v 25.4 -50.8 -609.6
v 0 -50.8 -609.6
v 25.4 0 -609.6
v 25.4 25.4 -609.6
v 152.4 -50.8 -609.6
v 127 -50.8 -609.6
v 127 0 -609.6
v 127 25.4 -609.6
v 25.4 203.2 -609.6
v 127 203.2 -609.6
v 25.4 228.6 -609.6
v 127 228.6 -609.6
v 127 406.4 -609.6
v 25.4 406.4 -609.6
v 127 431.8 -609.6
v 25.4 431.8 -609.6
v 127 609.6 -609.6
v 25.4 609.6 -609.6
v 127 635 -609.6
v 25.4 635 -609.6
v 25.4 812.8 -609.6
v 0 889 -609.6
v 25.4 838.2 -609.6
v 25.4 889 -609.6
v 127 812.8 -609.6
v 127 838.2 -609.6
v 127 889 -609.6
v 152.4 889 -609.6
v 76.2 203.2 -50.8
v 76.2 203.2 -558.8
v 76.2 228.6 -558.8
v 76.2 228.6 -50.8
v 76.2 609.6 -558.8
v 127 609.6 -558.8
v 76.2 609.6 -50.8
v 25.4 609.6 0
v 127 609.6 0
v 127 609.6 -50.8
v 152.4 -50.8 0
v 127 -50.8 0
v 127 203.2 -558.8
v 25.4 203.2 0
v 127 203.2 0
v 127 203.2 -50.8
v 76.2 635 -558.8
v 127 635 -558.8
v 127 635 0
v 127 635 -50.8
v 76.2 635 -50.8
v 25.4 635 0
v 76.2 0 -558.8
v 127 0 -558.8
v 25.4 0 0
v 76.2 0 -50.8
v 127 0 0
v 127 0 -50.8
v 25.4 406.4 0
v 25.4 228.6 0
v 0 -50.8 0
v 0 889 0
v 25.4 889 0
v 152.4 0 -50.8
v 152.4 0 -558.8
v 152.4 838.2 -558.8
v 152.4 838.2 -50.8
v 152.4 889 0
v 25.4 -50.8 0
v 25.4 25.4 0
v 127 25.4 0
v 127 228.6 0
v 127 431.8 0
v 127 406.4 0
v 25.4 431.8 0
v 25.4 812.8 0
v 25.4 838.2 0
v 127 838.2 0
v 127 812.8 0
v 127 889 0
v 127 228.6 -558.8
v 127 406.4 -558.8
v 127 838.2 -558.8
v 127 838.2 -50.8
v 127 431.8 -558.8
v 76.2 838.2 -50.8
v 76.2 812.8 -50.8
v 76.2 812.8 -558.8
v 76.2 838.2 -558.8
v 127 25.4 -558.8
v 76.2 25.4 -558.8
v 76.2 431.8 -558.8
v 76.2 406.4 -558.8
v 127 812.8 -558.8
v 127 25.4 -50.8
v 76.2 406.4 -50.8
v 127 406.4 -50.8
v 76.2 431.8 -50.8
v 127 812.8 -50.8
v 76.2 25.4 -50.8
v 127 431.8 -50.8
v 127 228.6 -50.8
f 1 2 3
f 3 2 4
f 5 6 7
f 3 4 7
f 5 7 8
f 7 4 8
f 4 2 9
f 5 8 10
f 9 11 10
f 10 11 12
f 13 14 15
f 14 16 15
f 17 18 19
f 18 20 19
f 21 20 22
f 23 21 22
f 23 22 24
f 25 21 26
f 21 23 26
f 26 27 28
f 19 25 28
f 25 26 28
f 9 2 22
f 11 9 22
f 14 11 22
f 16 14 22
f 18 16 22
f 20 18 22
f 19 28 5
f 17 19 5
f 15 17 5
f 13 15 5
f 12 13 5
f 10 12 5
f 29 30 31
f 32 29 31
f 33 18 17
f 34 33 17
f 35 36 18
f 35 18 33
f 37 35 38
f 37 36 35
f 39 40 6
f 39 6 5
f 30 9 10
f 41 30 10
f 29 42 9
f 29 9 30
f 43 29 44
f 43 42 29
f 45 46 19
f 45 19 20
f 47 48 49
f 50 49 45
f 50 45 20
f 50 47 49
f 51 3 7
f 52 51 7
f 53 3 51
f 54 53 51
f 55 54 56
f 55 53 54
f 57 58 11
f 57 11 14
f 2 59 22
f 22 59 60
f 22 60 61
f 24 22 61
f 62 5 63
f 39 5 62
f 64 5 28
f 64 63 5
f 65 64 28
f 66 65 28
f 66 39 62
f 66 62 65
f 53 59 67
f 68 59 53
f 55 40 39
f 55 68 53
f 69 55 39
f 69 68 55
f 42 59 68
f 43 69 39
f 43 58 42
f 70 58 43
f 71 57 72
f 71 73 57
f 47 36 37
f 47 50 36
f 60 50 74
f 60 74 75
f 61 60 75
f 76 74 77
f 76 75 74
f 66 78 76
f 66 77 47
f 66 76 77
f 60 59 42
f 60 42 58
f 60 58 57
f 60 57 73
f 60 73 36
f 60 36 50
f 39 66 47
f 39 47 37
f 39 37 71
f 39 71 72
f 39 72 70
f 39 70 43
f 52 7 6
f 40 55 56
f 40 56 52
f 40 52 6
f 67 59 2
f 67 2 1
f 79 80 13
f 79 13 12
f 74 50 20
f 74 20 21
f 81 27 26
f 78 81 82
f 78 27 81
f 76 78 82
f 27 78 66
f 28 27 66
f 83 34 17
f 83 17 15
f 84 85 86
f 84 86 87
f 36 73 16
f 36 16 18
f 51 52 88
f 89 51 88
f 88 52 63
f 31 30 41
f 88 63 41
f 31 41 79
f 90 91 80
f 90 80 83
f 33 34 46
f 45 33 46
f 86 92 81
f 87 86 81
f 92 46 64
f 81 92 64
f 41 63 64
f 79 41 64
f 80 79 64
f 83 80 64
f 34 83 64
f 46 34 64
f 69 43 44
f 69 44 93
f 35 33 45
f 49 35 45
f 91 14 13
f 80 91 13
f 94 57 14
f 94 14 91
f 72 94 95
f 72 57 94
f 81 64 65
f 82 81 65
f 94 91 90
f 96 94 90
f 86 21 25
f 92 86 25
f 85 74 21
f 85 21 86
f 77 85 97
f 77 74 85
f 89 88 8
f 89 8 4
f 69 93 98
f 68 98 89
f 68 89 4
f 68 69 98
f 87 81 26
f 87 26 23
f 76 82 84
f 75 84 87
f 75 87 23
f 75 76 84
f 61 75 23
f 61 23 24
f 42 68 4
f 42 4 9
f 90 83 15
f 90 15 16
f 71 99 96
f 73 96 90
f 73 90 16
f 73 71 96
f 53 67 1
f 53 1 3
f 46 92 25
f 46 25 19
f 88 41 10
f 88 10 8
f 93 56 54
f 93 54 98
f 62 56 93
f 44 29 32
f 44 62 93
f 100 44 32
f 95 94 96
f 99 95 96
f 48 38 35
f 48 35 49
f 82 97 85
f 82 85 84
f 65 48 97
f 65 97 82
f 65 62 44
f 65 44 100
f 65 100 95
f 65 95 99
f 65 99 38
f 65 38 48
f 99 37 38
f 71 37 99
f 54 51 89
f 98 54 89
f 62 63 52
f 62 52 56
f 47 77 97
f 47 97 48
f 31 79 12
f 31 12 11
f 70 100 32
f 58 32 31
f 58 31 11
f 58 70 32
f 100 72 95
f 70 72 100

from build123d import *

# Parameters (mm, degrees)
F1_DEPTH = 609.6
F2_W     = 25.4
F2_H     = 50.8
F2_H_2   = 838.2
F3_DEPTH = 609.6
F4_W     = 838.2
F4_H     = 508
F5_DEPTH = 76.2


with BuildPart() as f1:
    # F0 (on Top) → F1 (new body)
    with BuildSketch(Plane.XY):
        Polygon((152.4, 838.2), (0, 838.2), (0, 419.1), (0, 0), (152.4, 0), (152.4, 25.4), (25.4, 25.4), (25.4, 203.2), (152.4, 203.2), (152.4, 215.9), (152.4, 228.6), (25.4, 228.6), (25.4, 406.4), (152.4, 406.4), (152.4, 419.1), (152.4, 431.8), (25.4, 431.8), (25.4, 609.6), (152.4, 609.6), (152.4, 622.3), (152.4, 635), (25.4, 635), (25.4, 812.8), (152.4, 812.8), align=None)
    extrude(amount=-F1_DEPTH)

    # F2 (on face) → F3 (join)
    with BuildSketch(Plane.XY):
        with Locations((12.7, 863.6)):
            Rectangle(F2_W, F2_H)
        with Locations((12.7, -25.4)):
            Rectangle(F2_W, F2_H)
        with Locations((139.7, 419.1)):
            Rectangle(F2_W, F2_H_2)
        with Locations((139.7, 863.6)):
            Rectangle(F2_W, F2_H)
        with Locations((139.7, -25.4)):
            Rectangle(F2_W, F2_H)
    extrude(amount=-F3_DEPTH)

    # F4 (on face) → F5 (cut)
    with BuildSketch(Plane.YZ.offset(152.4)):
        with Locations((419.1, -304.8)):
            Rectangle(F4_W, F4_H)
    extrude(amount=-F5_DEPTH, mode=Mode.SUBTRACT)


solid = f1.part
